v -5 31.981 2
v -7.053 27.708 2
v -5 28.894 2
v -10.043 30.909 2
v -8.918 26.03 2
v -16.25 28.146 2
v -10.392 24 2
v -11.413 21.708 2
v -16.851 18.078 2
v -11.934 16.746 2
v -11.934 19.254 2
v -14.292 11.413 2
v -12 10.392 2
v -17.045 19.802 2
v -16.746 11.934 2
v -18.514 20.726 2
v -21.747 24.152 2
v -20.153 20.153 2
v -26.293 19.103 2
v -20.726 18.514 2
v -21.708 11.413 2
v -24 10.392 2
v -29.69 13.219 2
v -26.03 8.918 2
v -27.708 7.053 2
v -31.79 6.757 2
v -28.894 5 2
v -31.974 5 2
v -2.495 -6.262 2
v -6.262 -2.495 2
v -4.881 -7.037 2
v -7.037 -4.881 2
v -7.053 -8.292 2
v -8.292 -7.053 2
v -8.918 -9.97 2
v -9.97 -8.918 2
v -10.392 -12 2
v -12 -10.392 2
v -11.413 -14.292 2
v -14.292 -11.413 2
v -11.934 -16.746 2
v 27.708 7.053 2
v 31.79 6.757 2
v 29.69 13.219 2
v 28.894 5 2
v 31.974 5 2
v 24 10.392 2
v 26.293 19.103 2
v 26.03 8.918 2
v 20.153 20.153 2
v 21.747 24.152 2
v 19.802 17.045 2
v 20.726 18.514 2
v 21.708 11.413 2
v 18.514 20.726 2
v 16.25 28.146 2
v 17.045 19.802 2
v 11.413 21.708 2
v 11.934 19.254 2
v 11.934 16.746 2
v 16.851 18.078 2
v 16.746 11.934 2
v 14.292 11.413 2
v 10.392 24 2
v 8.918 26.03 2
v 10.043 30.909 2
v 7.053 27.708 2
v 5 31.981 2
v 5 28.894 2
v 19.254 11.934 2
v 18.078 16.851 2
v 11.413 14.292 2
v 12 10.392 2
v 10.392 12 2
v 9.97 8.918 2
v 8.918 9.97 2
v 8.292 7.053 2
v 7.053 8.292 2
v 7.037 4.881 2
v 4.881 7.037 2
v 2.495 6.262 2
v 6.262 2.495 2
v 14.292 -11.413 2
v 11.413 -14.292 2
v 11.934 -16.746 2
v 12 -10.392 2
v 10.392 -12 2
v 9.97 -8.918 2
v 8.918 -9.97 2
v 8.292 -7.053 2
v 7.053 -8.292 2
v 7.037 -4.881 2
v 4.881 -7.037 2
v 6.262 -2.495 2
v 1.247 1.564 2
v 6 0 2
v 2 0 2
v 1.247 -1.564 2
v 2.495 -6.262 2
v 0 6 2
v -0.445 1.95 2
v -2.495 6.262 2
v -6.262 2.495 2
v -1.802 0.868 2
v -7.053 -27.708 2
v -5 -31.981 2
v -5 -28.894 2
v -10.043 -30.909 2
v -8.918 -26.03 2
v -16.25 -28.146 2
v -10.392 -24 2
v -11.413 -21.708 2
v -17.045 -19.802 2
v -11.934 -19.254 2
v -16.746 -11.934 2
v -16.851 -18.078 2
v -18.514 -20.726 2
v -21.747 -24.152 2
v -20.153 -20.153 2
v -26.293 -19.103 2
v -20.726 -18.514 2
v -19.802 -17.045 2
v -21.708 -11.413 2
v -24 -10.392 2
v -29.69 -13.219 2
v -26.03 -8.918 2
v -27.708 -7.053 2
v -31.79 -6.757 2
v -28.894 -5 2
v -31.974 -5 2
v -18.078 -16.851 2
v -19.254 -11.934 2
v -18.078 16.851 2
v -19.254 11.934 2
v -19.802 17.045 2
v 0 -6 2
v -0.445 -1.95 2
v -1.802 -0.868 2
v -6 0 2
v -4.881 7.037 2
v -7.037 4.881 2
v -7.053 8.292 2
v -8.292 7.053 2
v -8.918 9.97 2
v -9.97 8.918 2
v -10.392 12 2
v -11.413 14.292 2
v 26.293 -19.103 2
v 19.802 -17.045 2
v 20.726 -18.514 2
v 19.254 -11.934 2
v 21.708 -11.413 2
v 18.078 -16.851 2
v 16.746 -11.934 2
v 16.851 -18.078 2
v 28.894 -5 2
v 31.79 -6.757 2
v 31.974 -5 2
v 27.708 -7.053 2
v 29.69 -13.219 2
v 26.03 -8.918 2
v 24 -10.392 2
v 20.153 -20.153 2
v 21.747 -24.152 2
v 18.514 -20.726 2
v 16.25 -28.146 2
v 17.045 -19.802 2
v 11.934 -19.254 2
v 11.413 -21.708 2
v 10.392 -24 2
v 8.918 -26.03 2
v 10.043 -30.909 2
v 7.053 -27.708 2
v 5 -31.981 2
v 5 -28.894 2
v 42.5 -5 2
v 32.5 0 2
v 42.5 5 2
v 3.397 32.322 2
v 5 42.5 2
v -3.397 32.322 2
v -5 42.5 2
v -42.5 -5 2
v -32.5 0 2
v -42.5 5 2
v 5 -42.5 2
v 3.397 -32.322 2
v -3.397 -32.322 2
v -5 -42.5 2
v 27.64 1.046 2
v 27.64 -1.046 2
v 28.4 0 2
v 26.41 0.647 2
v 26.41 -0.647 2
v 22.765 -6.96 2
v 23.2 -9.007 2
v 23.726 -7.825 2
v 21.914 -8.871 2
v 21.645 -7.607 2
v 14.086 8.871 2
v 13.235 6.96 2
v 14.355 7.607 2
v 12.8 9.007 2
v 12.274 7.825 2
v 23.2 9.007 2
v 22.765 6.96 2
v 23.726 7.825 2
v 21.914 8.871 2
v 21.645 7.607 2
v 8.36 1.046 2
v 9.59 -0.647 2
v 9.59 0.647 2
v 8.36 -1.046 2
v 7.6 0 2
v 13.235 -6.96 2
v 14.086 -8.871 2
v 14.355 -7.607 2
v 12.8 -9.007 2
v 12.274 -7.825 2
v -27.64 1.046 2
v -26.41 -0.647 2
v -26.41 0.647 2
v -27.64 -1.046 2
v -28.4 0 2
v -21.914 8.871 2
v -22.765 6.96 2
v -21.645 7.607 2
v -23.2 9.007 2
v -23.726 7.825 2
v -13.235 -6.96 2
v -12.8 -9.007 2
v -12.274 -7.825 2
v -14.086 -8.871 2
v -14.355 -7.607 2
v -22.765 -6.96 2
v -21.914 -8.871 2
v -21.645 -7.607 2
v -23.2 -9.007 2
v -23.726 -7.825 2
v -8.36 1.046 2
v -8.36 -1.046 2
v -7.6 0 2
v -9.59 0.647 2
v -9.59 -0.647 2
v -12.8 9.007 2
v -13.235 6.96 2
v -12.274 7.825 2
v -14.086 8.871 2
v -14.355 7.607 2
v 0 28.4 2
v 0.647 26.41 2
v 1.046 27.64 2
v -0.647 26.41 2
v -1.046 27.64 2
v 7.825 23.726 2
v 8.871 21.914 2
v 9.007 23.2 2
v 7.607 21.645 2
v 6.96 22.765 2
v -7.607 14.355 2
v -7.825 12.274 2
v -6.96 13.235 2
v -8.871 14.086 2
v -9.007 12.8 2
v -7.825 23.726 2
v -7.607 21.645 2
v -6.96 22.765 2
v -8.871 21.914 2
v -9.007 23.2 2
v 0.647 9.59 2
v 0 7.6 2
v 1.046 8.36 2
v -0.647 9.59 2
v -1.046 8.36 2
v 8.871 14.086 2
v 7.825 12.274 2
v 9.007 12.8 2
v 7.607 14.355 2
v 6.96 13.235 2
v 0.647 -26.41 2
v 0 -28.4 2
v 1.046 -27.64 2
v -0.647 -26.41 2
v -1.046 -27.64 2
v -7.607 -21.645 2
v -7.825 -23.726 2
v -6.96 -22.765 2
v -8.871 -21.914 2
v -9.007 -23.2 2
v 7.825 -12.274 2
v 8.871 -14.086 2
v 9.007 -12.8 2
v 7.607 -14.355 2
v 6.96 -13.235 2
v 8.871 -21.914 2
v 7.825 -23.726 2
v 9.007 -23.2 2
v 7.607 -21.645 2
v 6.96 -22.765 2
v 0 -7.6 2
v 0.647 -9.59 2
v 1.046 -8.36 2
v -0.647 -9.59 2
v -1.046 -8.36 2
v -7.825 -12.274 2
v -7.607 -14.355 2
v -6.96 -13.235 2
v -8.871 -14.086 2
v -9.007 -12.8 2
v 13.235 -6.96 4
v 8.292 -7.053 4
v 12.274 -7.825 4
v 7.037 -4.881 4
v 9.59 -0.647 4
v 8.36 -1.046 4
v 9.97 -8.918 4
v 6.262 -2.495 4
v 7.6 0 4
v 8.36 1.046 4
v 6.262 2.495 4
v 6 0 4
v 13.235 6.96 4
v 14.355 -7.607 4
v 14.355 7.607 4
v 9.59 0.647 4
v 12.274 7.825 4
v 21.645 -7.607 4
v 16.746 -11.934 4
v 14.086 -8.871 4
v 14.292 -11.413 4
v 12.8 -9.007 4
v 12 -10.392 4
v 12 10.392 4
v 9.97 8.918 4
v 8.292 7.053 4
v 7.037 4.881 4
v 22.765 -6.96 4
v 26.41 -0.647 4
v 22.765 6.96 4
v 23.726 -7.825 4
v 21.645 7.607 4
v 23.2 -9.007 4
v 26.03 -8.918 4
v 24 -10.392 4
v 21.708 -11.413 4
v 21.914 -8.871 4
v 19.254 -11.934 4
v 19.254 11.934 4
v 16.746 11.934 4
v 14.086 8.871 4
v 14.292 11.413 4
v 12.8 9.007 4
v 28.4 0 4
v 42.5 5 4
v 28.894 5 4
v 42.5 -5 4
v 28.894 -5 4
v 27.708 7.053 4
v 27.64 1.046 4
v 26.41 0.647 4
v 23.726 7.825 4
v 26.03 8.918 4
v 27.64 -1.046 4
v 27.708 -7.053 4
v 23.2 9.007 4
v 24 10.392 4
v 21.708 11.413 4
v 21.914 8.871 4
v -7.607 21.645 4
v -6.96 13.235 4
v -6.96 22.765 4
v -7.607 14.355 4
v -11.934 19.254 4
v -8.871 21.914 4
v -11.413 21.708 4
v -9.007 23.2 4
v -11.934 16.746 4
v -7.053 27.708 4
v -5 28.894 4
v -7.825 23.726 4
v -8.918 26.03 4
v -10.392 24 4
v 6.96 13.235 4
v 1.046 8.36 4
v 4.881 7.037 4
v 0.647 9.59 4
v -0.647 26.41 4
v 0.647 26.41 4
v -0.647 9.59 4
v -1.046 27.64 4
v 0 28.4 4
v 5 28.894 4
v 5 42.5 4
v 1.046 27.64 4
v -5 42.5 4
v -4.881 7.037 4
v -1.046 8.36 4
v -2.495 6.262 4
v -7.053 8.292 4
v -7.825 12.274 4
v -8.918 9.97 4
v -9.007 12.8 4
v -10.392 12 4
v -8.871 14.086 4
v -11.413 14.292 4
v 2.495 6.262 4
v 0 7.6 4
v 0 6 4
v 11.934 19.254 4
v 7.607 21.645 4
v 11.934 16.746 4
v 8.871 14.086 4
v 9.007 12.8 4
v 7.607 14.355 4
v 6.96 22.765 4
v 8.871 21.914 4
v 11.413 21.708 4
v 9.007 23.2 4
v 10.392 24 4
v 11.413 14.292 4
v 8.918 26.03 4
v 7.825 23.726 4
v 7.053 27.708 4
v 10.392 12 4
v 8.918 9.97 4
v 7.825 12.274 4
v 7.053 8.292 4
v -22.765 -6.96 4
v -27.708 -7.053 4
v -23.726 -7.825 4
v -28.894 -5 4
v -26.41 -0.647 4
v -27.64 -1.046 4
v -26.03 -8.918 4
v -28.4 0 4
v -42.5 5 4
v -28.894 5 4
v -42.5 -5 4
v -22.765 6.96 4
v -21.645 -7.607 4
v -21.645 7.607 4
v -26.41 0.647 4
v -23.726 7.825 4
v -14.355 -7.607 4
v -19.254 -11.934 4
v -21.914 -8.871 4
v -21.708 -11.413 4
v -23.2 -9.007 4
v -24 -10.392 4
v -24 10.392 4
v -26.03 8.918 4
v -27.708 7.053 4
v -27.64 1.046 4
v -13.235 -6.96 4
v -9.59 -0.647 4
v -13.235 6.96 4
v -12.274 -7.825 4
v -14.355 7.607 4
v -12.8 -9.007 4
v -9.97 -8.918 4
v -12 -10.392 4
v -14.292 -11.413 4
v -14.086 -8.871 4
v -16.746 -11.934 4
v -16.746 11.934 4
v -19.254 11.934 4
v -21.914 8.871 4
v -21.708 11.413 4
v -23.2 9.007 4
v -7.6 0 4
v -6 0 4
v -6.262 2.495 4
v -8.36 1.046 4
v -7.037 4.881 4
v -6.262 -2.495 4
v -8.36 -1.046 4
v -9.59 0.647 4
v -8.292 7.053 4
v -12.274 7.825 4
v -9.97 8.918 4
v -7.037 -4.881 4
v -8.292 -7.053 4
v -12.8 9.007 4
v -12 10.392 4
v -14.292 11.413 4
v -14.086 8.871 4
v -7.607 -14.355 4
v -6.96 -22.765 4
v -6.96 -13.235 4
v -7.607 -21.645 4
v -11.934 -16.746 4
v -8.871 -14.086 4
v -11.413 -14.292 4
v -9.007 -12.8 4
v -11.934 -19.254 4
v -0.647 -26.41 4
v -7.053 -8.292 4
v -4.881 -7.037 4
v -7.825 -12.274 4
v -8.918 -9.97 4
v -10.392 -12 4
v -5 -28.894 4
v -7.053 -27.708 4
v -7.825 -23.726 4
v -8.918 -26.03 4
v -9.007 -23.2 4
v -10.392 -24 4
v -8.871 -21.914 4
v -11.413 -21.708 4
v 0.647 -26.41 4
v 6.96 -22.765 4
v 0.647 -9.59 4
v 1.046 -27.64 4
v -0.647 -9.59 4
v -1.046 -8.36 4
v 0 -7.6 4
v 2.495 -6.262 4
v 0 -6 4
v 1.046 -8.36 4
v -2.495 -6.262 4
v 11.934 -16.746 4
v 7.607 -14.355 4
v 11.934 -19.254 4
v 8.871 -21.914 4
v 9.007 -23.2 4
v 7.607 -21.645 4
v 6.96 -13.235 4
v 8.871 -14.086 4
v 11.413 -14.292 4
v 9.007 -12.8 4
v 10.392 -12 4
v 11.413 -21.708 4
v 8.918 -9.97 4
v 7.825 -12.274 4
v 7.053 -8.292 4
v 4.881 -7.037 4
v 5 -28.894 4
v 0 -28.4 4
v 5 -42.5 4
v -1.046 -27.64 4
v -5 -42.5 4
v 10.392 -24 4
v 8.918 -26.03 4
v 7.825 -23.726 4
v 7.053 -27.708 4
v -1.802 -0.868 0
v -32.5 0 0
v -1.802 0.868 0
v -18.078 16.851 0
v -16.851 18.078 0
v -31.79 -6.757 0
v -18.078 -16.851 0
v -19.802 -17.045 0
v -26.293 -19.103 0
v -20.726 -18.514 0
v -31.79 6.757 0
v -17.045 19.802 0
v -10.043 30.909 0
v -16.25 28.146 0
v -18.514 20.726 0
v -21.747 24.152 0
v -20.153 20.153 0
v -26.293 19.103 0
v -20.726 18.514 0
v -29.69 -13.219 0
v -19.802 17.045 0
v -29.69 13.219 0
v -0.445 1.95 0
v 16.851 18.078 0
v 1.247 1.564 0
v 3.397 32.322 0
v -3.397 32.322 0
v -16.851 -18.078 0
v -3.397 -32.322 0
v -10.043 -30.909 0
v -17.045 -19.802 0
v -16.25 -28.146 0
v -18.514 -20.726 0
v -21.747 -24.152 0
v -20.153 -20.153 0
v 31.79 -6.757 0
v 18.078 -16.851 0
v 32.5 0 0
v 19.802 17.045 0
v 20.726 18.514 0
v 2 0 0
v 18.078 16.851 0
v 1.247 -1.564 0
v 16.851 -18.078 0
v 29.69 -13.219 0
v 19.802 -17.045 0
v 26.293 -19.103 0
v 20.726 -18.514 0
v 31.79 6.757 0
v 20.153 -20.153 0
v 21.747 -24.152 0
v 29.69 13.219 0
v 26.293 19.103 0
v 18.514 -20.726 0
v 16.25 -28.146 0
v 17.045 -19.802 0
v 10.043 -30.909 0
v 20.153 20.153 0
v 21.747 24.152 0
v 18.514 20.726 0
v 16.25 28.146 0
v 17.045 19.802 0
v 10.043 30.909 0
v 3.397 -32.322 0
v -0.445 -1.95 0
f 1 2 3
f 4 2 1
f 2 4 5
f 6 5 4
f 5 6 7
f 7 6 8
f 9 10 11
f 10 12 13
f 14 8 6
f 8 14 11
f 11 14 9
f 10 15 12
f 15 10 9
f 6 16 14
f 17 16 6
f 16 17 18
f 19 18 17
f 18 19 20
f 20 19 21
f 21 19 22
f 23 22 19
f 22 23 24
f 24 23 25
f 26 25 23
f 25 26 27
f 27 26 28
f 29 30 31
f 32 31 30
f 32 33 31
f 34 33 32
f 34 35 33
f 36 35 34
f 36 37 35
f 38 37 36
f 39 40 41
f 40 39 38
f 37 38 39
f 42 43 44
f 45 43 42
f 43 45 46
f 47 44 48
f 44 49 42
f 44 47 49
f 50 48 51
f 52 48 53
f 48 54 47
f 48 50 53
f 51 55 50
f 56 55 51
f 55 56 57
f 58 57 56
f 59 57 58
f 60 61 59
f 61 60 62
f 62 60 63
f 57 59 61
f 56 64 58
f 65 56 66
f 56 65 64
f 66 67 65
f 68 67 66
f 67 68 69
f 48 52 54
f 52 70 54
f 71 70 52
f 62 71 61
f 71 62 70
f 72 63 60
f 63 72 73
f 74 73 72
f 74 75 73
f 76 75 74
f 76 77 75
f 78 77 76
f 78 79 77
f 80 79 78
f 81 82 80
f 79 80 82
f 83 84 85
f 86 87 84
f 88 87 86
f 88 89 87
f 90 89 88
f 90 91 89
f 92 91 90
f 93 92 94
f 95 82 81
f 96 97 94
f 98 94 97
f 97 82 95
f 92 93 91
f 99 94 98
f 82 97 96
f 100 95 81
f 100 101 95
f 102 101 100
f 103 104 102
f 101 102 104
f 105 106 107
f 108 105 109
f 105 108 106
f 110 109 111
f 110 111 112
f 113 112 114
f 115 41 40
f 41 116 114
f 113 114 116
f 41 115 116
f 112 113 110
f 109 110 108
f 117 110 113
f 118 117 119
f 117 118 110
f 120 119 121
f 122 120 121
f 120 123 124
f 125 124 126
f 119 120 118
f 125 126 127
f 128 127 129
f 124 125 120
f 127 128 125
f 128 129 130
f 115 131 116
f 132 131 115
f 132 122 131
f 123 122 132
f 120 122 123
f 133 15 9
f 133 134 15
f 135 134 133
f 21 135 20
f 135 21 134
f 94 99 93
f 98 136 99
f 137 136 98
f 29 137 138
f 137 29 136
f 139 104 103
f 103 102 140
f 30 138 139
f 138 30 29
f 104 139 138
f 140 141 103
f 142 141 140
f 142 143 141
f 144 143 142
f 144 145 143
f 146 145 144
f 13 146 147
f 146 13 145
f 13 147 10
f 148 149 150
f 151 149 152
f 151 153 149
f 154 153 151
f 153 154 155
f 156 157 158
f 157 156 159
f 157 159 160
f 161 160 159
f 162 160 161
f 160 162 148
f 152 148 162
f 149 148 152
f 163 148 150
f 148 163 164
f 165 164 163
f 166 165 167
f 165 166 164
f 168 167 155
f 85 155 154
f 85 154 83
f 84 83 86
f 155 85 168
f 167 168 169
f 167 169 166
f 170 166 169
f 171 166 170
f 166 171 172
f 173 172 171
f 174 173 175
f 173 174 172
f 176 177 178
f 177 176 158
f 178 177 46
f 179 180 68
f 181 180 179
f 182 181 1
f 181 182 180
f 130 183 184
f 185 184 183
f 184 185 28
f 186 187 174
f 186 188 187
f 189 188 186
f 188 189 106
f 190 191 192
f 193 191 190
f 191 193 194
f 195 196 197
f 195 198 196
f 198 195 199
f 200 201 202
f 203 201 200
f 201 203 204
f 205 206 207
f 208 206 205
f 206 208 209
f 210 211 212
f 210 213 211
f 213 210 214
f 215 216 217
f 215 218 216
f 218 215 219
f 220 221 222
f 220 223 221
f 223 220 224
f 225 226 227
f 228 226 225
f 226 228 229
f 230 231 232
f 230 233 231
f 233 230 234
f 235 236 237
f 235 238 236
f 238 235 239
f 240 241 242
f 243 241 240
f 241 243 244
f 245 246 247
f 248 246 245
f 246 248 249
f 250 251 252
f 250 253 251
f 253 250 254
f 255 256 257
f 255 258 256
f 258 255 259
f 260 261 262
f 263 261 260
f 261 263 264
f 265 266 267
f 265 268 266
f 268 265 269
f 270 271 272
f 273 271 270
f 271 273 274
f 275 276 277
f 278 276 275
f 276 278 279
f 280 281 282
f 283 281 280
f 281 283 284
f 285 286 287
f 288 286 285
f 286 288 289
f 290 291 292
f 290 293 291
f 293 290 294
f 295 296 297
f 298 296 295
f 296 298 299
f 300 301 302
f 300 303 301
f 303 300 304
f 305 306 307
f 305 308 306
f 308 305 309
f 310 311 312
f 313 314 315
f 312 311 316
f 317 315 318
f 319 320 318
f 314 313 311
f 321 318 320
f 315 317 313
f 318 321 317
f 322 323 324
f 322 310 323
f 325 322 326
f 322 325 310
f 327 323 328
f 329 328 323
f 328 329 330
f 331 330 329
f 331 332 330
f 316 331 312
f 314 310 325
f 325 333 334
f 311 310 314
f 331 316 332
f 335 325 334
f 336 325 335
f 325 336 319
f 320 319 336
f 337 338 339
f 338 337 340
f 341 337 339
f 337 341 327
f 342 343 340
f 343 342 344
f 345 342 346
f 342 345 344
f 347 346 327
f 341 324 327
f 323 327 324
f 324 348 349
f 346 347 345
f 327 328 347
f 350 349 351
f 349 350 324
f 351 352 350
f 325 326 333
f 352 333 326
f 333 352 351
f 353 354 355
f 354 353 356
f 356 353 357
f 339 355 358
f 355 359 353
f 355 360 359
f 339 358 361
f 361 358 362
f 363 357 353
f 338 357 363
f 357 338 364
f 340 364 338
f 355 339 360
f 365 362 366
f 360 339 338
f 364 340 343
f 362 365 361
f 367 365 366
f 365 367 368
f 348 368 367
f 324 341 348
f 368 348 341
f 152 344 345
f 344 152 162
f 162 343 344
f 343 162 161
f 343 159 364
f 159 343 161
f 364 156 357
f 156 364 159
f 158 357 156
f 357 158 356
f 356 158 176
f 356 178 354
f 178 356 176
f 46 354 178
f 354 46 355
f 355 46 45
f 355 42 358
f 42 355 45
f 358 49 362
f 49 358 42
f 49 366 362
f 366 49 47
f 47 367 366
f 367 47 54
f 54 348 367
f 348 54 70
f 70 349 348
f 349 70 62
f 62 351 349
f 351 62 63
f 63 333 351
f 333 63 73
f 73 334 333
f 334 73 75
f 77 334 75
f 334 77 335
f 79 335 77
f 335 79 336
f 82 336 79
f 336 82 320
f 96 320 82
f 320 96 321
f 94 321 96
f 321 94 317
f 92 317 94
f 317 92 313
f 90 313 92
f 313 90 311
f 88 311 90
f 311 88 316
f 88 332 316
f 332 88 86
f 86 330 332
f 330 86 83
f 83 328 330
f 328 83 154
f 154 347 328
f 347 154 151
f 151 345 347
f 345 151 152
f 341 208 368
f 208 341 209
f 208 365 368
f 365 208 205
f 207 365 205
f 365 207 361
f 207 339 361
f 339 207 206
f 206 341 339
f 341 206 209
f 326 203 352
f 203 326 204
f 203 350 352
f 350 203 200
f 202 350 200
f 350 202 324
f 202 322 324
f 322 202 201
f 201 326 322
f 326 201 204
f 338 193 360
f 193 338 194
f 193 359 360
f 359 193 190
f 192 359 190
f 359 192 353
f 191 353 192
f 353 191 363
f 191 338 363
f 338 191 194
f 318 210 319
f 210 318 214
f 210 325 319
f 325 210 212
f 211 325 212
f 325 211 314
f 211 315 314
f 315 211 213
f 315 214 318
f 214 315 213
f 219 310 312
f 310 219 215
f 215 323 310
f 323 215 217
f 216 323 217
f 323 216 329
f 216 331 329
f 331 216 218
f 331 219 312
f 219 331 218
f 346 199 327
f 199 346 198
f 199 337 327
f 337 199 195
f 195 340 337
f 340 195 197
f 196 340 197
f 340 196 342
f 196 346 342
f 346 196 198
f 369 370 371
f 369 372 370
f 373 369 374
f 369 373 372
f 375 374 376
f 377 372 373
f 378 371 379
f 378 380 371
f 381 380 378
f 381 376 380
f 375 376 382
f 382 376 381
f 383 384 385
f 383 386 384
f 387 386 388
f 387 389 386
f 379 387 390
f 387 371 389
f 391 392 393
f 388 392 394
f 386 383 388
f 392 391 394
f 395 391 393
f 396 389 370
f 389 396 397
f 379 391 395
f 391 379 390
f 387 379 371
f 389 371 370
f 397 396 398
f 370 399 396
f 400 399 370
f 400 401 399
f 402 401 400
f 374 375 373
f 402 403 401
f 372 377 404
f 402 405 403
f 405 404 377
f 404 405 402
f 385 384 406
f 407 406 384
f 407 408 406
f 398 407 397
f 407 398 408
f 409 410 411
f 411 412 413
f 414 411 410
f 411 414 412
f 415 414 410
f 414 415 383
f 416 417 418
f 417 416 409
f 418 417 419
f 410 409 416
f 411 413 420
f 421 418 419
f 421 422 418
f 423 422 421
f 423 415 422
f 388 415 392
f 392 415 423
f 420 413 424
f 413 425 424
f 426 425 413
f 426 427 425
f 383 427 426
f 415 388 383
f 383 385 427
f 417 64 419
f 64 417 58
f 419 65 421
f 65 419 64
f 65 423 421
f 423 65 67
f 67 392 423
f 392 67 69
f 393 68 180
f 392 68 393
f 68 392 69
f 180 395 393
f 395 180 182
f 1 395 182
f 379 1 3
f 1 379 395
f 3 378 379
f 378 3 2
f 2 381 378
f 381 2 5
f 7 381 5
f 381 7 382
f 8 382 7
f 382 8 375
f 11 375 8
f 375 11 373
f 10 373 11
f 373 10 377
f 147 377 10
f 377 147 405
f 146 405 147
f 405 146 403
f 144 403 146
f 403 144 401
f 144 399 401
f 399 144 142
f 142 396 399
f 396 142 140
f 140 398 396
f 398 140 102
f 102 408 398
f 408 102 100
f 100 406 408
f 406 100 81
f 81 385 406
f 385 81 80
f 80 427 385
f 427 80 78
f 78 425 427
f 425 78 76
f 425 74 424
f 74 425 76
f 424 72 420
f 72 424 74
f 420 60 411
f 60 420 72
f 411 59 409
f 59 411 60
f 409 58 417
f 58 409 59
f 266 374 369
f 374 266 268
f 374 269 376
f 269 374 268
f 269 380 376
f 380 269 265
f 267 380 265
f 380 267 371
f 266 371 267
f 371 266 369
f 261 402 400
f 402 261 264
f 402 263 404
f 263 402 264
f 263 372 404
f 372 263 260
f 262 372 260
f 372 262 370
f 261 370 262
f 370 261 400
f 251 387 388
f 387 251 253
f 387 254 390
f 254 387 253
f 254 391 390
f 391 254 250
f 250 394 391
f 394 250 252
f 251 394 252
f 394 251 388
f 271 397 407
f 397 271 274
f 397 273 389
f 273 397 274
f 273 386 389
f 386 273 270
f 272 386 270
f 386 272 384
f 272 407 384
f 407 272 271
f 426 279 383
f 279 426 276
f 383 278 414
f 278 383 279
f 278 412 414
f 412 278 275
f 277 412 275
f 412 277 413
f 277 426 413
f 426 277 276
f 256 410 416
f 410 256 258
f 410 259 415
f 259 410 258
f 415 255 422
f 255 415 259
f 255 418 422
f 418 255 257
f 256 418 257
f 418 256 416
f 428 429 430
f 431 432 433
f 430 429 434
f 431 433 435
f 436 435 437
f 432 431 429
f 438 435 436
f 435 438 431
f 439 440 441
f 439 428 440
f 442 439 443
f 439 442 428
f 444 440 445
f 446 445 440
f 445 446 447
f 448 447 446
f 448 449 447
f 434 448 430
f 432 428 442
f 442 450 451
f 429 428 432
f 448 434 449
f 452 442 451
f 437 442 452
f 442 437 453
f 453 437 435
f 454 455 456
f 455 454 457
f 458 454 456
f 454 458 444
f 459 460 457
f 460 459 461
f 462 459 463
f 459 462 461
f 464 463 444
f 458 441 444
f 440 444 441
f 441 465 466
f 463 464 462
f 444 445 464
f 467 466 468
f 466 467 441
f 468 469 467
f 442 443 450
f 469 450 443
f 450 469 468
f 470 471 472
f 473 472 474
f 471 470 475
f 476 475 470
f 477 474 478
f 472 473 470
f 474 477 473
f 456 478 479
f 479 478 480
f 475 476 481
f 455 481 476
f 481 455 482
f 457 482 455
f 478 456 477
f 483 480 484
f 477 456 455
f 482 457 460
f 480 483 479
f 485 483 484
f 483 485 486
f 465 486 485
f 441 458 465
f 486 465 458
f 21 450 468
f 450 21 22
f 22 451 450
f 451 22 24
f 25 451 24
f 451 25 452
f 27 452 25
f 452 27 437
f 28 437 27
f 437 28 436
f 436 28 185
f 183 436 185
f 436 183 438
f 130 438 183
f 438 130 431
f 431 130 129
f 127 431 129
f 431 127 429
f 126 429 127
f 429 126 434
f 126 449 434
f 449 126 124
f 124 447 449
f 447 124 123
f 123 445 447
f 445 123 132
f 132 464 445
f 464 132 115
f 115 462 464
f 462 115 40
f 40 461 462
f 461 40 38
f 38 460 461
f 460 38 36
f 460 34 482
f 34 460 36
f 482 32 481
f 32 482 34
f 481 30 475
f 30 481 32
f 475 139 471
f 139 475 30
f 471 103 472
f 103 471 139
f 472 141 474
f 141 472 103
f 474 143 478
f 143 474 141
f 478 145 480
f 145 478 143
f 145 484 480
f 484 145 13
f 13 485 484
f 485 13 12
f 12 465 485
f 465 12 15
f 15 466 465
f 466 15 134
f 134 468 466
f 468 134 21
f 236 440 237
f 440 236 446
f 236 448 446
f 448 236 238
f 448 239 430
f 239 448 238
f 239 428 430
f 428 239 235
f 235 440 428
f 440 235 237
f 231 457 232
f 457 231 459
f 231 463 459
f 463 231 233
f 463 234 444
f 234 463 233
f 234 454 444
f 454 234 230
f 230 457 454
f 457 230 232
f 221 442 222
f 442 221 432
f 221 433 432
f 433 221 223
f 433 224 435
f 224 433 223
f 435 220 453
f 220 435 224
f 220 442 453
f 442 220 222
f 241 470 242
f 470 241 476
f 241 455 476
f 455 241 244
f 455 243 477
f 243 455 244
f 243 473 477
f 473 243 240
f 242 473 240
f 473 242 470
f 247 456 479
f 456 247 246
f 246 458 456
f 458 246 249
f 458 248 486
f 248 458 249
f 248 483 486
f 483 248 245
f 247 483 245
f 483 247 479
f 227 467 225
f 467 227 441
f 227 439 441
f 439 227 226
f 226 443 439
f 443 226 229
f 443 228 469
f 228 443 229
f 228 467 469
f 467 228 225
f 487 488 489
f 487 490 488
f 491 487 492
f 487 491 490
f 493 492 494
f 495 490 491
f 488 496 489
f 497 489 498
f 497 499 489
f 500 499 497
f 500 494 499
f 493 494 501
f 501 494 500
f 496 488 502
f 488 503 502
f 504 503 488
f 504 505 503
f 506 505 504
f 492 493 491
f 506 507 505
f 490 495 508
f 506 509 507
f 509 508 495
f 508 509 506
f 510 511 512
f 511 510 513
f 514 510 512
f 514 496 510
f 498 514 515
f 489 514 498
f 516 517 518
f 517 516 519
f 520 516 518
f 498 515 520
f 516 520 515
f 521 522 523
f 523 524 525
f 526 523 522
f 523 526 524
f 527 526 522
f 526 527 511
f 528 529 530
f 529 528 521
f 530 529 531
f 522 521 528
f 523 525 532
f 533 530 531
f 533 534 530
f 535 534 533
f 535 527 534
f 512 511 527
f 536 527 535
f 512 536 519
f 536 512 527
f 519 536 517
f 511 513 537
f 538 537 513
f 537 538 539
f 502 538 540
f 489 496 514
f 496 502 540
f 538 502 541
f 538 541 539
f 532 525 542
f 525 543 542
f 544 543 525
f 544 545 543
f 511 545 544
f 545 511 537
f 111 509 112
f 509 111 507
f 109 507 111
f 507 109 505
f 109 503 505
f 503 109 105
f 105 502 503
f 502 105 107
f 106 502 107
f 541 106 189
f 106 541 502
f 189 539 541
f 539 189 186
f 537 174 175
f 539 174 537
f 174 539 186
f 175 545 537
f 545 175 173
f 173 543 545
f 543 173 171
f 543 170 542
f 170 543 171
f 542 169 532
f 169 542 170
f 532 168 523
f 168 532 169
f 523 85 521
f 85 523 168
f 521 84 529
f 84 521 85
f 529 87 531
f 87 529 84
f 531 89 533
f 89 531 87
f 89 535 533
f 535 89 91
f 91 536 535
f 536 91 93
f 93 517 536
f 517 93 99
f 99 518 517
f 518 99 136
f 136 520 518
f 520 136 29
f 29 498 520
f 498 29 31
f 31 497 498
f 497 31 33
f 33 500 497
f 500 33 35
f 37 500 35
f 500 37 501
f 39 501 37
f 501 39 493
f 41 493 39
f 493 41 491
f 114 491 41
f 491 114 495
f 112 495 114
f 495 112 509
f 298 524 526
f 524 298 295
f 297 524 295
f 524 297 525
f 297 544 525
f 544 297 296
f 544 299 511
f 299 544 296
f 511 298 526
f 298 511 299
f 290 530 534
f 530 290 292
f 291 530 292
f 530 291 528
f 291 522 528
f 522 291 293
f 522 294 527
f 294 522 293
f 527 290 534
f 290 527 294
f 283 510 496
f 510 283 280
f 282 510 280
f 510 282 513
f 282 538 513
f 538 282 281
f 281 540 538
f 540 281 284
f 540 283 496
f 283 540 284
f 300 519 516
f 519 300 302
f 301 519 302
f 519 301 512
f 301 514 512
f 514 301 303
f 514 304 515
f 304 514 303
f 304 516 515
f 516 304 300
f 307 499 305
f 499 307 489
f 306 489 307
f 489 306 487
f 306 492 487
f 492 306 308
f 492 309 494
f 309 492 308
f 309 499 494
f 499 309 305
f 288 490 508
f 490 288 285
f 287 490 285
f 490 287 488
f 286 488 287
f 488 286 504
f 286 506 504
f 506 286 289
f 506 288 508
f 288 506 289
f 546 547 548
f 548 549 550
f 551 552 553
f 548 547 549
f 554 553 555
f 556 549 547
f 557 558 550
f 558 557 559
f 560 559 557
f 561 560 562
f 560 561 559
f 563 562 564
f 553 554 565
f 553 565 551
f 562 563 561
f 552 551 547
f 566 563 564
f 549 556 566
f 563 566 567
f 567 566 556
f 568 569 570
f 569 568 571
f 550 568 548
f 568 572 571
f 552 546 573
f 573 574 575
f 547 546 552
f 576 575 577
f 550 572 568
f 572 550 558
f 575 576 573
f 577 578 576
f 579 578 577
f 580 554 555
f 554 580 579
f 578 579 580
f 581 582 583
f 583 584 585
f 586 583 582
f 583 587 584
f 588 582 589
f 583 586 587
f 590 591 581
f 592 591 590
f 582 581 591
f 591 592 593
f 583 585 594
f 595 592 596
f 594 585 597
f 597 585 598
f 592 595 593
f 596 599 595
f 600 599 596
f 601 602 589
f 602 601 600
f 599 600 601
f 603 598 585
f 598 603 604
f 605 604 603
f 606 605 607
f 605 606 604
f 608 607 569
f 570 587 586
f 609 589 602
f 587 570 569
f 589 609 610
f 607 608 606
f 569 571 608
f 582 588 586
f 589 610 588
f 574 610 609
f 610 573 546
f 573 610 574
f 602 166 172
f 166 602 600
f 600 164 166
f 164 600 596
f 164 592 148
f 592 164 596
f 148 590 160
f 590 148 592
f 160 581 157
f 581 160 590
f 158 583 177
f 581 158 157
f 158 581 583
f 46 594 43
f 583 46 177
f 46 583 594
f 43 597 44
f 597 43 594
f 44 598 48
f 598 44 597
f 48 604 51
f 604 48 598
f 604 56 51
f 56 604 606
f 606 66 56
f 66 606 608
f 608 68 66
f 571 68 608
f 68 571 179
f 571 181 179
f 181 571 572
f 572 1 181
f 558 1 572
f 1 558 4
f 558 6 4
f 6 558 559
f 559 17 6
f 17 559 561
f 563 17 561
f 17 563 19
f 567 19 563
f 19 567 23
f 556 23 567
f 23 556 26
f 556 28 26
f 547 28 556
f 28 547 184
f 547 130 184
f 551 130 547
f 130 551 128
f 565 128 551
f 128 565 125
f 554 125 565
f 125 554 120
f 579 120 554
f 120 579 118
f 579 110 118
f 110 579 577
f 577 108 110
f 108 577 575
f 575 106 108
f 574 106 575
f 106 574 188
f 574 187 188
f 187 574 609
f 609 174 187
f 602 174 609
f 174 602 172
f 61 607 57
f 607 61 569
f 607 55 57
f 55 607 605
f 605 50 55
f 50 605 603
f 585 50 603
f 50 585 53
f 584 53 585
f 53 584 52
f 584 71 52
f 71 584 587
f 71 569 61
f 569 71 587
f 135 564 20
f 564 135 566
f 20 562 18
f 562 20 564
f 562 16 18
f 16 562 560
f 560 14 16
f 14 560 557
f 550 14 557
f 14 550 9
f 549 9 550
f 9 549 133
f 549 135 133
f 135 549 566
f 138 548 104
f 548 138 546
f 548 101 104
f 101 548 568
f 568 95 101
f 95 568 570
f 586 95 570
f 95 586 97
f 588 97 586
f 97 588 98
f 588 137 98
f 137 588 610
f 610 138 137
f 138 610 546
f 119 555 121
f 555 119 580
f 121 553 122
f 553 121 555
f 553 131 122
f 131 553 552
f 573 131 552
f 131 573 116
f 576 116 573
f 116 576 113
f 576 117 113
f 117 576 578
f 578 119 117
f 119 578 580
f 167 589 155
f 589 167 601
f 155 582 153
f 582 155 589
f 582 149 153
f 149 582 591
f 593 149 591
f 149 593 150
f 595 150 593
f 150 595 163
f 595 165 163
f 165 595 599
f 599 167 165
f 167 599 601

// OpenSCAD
module mcpcb(drill, num_holes)
{
	linear_extrude(2) {
		difference() {
			union() {
				circle (r=24/2);
				translate([24.5/2, 0, 0])
					square(size=[24.5, 10], center=true);
			}
			for (i=[0:num_holes-1]) {
				rotate([0, 0, i*360/num_holes])
					translate([9.3, 0, 0])
						circle(drill/2);
			}
		}
	}
}

module mcpcb_pattern(n, r)
{
	for (i=[0:n-1]) {
		rotate([0, 0, i*360/n])
			translate([r, 0, 0])
				mcpcb(drill = 2.2, num_holes = 6);
	}
}

module holder_board(d)
{
	drill = 4;
	linear_extrude(2) {
		difference() {
			circle(d/2);
			for (i=[0:4])
				rotate([0, 0, 45+(i*90)])
					translate([(d/2)-6, 0, 0])
						circle(drill/2);
			circle(drill/2);
		}
	}
}

color("green") holder_board(65);
translate([0, 0, 2]) {
	color("Gold") mcpcb_pattern(4, 18);
}
